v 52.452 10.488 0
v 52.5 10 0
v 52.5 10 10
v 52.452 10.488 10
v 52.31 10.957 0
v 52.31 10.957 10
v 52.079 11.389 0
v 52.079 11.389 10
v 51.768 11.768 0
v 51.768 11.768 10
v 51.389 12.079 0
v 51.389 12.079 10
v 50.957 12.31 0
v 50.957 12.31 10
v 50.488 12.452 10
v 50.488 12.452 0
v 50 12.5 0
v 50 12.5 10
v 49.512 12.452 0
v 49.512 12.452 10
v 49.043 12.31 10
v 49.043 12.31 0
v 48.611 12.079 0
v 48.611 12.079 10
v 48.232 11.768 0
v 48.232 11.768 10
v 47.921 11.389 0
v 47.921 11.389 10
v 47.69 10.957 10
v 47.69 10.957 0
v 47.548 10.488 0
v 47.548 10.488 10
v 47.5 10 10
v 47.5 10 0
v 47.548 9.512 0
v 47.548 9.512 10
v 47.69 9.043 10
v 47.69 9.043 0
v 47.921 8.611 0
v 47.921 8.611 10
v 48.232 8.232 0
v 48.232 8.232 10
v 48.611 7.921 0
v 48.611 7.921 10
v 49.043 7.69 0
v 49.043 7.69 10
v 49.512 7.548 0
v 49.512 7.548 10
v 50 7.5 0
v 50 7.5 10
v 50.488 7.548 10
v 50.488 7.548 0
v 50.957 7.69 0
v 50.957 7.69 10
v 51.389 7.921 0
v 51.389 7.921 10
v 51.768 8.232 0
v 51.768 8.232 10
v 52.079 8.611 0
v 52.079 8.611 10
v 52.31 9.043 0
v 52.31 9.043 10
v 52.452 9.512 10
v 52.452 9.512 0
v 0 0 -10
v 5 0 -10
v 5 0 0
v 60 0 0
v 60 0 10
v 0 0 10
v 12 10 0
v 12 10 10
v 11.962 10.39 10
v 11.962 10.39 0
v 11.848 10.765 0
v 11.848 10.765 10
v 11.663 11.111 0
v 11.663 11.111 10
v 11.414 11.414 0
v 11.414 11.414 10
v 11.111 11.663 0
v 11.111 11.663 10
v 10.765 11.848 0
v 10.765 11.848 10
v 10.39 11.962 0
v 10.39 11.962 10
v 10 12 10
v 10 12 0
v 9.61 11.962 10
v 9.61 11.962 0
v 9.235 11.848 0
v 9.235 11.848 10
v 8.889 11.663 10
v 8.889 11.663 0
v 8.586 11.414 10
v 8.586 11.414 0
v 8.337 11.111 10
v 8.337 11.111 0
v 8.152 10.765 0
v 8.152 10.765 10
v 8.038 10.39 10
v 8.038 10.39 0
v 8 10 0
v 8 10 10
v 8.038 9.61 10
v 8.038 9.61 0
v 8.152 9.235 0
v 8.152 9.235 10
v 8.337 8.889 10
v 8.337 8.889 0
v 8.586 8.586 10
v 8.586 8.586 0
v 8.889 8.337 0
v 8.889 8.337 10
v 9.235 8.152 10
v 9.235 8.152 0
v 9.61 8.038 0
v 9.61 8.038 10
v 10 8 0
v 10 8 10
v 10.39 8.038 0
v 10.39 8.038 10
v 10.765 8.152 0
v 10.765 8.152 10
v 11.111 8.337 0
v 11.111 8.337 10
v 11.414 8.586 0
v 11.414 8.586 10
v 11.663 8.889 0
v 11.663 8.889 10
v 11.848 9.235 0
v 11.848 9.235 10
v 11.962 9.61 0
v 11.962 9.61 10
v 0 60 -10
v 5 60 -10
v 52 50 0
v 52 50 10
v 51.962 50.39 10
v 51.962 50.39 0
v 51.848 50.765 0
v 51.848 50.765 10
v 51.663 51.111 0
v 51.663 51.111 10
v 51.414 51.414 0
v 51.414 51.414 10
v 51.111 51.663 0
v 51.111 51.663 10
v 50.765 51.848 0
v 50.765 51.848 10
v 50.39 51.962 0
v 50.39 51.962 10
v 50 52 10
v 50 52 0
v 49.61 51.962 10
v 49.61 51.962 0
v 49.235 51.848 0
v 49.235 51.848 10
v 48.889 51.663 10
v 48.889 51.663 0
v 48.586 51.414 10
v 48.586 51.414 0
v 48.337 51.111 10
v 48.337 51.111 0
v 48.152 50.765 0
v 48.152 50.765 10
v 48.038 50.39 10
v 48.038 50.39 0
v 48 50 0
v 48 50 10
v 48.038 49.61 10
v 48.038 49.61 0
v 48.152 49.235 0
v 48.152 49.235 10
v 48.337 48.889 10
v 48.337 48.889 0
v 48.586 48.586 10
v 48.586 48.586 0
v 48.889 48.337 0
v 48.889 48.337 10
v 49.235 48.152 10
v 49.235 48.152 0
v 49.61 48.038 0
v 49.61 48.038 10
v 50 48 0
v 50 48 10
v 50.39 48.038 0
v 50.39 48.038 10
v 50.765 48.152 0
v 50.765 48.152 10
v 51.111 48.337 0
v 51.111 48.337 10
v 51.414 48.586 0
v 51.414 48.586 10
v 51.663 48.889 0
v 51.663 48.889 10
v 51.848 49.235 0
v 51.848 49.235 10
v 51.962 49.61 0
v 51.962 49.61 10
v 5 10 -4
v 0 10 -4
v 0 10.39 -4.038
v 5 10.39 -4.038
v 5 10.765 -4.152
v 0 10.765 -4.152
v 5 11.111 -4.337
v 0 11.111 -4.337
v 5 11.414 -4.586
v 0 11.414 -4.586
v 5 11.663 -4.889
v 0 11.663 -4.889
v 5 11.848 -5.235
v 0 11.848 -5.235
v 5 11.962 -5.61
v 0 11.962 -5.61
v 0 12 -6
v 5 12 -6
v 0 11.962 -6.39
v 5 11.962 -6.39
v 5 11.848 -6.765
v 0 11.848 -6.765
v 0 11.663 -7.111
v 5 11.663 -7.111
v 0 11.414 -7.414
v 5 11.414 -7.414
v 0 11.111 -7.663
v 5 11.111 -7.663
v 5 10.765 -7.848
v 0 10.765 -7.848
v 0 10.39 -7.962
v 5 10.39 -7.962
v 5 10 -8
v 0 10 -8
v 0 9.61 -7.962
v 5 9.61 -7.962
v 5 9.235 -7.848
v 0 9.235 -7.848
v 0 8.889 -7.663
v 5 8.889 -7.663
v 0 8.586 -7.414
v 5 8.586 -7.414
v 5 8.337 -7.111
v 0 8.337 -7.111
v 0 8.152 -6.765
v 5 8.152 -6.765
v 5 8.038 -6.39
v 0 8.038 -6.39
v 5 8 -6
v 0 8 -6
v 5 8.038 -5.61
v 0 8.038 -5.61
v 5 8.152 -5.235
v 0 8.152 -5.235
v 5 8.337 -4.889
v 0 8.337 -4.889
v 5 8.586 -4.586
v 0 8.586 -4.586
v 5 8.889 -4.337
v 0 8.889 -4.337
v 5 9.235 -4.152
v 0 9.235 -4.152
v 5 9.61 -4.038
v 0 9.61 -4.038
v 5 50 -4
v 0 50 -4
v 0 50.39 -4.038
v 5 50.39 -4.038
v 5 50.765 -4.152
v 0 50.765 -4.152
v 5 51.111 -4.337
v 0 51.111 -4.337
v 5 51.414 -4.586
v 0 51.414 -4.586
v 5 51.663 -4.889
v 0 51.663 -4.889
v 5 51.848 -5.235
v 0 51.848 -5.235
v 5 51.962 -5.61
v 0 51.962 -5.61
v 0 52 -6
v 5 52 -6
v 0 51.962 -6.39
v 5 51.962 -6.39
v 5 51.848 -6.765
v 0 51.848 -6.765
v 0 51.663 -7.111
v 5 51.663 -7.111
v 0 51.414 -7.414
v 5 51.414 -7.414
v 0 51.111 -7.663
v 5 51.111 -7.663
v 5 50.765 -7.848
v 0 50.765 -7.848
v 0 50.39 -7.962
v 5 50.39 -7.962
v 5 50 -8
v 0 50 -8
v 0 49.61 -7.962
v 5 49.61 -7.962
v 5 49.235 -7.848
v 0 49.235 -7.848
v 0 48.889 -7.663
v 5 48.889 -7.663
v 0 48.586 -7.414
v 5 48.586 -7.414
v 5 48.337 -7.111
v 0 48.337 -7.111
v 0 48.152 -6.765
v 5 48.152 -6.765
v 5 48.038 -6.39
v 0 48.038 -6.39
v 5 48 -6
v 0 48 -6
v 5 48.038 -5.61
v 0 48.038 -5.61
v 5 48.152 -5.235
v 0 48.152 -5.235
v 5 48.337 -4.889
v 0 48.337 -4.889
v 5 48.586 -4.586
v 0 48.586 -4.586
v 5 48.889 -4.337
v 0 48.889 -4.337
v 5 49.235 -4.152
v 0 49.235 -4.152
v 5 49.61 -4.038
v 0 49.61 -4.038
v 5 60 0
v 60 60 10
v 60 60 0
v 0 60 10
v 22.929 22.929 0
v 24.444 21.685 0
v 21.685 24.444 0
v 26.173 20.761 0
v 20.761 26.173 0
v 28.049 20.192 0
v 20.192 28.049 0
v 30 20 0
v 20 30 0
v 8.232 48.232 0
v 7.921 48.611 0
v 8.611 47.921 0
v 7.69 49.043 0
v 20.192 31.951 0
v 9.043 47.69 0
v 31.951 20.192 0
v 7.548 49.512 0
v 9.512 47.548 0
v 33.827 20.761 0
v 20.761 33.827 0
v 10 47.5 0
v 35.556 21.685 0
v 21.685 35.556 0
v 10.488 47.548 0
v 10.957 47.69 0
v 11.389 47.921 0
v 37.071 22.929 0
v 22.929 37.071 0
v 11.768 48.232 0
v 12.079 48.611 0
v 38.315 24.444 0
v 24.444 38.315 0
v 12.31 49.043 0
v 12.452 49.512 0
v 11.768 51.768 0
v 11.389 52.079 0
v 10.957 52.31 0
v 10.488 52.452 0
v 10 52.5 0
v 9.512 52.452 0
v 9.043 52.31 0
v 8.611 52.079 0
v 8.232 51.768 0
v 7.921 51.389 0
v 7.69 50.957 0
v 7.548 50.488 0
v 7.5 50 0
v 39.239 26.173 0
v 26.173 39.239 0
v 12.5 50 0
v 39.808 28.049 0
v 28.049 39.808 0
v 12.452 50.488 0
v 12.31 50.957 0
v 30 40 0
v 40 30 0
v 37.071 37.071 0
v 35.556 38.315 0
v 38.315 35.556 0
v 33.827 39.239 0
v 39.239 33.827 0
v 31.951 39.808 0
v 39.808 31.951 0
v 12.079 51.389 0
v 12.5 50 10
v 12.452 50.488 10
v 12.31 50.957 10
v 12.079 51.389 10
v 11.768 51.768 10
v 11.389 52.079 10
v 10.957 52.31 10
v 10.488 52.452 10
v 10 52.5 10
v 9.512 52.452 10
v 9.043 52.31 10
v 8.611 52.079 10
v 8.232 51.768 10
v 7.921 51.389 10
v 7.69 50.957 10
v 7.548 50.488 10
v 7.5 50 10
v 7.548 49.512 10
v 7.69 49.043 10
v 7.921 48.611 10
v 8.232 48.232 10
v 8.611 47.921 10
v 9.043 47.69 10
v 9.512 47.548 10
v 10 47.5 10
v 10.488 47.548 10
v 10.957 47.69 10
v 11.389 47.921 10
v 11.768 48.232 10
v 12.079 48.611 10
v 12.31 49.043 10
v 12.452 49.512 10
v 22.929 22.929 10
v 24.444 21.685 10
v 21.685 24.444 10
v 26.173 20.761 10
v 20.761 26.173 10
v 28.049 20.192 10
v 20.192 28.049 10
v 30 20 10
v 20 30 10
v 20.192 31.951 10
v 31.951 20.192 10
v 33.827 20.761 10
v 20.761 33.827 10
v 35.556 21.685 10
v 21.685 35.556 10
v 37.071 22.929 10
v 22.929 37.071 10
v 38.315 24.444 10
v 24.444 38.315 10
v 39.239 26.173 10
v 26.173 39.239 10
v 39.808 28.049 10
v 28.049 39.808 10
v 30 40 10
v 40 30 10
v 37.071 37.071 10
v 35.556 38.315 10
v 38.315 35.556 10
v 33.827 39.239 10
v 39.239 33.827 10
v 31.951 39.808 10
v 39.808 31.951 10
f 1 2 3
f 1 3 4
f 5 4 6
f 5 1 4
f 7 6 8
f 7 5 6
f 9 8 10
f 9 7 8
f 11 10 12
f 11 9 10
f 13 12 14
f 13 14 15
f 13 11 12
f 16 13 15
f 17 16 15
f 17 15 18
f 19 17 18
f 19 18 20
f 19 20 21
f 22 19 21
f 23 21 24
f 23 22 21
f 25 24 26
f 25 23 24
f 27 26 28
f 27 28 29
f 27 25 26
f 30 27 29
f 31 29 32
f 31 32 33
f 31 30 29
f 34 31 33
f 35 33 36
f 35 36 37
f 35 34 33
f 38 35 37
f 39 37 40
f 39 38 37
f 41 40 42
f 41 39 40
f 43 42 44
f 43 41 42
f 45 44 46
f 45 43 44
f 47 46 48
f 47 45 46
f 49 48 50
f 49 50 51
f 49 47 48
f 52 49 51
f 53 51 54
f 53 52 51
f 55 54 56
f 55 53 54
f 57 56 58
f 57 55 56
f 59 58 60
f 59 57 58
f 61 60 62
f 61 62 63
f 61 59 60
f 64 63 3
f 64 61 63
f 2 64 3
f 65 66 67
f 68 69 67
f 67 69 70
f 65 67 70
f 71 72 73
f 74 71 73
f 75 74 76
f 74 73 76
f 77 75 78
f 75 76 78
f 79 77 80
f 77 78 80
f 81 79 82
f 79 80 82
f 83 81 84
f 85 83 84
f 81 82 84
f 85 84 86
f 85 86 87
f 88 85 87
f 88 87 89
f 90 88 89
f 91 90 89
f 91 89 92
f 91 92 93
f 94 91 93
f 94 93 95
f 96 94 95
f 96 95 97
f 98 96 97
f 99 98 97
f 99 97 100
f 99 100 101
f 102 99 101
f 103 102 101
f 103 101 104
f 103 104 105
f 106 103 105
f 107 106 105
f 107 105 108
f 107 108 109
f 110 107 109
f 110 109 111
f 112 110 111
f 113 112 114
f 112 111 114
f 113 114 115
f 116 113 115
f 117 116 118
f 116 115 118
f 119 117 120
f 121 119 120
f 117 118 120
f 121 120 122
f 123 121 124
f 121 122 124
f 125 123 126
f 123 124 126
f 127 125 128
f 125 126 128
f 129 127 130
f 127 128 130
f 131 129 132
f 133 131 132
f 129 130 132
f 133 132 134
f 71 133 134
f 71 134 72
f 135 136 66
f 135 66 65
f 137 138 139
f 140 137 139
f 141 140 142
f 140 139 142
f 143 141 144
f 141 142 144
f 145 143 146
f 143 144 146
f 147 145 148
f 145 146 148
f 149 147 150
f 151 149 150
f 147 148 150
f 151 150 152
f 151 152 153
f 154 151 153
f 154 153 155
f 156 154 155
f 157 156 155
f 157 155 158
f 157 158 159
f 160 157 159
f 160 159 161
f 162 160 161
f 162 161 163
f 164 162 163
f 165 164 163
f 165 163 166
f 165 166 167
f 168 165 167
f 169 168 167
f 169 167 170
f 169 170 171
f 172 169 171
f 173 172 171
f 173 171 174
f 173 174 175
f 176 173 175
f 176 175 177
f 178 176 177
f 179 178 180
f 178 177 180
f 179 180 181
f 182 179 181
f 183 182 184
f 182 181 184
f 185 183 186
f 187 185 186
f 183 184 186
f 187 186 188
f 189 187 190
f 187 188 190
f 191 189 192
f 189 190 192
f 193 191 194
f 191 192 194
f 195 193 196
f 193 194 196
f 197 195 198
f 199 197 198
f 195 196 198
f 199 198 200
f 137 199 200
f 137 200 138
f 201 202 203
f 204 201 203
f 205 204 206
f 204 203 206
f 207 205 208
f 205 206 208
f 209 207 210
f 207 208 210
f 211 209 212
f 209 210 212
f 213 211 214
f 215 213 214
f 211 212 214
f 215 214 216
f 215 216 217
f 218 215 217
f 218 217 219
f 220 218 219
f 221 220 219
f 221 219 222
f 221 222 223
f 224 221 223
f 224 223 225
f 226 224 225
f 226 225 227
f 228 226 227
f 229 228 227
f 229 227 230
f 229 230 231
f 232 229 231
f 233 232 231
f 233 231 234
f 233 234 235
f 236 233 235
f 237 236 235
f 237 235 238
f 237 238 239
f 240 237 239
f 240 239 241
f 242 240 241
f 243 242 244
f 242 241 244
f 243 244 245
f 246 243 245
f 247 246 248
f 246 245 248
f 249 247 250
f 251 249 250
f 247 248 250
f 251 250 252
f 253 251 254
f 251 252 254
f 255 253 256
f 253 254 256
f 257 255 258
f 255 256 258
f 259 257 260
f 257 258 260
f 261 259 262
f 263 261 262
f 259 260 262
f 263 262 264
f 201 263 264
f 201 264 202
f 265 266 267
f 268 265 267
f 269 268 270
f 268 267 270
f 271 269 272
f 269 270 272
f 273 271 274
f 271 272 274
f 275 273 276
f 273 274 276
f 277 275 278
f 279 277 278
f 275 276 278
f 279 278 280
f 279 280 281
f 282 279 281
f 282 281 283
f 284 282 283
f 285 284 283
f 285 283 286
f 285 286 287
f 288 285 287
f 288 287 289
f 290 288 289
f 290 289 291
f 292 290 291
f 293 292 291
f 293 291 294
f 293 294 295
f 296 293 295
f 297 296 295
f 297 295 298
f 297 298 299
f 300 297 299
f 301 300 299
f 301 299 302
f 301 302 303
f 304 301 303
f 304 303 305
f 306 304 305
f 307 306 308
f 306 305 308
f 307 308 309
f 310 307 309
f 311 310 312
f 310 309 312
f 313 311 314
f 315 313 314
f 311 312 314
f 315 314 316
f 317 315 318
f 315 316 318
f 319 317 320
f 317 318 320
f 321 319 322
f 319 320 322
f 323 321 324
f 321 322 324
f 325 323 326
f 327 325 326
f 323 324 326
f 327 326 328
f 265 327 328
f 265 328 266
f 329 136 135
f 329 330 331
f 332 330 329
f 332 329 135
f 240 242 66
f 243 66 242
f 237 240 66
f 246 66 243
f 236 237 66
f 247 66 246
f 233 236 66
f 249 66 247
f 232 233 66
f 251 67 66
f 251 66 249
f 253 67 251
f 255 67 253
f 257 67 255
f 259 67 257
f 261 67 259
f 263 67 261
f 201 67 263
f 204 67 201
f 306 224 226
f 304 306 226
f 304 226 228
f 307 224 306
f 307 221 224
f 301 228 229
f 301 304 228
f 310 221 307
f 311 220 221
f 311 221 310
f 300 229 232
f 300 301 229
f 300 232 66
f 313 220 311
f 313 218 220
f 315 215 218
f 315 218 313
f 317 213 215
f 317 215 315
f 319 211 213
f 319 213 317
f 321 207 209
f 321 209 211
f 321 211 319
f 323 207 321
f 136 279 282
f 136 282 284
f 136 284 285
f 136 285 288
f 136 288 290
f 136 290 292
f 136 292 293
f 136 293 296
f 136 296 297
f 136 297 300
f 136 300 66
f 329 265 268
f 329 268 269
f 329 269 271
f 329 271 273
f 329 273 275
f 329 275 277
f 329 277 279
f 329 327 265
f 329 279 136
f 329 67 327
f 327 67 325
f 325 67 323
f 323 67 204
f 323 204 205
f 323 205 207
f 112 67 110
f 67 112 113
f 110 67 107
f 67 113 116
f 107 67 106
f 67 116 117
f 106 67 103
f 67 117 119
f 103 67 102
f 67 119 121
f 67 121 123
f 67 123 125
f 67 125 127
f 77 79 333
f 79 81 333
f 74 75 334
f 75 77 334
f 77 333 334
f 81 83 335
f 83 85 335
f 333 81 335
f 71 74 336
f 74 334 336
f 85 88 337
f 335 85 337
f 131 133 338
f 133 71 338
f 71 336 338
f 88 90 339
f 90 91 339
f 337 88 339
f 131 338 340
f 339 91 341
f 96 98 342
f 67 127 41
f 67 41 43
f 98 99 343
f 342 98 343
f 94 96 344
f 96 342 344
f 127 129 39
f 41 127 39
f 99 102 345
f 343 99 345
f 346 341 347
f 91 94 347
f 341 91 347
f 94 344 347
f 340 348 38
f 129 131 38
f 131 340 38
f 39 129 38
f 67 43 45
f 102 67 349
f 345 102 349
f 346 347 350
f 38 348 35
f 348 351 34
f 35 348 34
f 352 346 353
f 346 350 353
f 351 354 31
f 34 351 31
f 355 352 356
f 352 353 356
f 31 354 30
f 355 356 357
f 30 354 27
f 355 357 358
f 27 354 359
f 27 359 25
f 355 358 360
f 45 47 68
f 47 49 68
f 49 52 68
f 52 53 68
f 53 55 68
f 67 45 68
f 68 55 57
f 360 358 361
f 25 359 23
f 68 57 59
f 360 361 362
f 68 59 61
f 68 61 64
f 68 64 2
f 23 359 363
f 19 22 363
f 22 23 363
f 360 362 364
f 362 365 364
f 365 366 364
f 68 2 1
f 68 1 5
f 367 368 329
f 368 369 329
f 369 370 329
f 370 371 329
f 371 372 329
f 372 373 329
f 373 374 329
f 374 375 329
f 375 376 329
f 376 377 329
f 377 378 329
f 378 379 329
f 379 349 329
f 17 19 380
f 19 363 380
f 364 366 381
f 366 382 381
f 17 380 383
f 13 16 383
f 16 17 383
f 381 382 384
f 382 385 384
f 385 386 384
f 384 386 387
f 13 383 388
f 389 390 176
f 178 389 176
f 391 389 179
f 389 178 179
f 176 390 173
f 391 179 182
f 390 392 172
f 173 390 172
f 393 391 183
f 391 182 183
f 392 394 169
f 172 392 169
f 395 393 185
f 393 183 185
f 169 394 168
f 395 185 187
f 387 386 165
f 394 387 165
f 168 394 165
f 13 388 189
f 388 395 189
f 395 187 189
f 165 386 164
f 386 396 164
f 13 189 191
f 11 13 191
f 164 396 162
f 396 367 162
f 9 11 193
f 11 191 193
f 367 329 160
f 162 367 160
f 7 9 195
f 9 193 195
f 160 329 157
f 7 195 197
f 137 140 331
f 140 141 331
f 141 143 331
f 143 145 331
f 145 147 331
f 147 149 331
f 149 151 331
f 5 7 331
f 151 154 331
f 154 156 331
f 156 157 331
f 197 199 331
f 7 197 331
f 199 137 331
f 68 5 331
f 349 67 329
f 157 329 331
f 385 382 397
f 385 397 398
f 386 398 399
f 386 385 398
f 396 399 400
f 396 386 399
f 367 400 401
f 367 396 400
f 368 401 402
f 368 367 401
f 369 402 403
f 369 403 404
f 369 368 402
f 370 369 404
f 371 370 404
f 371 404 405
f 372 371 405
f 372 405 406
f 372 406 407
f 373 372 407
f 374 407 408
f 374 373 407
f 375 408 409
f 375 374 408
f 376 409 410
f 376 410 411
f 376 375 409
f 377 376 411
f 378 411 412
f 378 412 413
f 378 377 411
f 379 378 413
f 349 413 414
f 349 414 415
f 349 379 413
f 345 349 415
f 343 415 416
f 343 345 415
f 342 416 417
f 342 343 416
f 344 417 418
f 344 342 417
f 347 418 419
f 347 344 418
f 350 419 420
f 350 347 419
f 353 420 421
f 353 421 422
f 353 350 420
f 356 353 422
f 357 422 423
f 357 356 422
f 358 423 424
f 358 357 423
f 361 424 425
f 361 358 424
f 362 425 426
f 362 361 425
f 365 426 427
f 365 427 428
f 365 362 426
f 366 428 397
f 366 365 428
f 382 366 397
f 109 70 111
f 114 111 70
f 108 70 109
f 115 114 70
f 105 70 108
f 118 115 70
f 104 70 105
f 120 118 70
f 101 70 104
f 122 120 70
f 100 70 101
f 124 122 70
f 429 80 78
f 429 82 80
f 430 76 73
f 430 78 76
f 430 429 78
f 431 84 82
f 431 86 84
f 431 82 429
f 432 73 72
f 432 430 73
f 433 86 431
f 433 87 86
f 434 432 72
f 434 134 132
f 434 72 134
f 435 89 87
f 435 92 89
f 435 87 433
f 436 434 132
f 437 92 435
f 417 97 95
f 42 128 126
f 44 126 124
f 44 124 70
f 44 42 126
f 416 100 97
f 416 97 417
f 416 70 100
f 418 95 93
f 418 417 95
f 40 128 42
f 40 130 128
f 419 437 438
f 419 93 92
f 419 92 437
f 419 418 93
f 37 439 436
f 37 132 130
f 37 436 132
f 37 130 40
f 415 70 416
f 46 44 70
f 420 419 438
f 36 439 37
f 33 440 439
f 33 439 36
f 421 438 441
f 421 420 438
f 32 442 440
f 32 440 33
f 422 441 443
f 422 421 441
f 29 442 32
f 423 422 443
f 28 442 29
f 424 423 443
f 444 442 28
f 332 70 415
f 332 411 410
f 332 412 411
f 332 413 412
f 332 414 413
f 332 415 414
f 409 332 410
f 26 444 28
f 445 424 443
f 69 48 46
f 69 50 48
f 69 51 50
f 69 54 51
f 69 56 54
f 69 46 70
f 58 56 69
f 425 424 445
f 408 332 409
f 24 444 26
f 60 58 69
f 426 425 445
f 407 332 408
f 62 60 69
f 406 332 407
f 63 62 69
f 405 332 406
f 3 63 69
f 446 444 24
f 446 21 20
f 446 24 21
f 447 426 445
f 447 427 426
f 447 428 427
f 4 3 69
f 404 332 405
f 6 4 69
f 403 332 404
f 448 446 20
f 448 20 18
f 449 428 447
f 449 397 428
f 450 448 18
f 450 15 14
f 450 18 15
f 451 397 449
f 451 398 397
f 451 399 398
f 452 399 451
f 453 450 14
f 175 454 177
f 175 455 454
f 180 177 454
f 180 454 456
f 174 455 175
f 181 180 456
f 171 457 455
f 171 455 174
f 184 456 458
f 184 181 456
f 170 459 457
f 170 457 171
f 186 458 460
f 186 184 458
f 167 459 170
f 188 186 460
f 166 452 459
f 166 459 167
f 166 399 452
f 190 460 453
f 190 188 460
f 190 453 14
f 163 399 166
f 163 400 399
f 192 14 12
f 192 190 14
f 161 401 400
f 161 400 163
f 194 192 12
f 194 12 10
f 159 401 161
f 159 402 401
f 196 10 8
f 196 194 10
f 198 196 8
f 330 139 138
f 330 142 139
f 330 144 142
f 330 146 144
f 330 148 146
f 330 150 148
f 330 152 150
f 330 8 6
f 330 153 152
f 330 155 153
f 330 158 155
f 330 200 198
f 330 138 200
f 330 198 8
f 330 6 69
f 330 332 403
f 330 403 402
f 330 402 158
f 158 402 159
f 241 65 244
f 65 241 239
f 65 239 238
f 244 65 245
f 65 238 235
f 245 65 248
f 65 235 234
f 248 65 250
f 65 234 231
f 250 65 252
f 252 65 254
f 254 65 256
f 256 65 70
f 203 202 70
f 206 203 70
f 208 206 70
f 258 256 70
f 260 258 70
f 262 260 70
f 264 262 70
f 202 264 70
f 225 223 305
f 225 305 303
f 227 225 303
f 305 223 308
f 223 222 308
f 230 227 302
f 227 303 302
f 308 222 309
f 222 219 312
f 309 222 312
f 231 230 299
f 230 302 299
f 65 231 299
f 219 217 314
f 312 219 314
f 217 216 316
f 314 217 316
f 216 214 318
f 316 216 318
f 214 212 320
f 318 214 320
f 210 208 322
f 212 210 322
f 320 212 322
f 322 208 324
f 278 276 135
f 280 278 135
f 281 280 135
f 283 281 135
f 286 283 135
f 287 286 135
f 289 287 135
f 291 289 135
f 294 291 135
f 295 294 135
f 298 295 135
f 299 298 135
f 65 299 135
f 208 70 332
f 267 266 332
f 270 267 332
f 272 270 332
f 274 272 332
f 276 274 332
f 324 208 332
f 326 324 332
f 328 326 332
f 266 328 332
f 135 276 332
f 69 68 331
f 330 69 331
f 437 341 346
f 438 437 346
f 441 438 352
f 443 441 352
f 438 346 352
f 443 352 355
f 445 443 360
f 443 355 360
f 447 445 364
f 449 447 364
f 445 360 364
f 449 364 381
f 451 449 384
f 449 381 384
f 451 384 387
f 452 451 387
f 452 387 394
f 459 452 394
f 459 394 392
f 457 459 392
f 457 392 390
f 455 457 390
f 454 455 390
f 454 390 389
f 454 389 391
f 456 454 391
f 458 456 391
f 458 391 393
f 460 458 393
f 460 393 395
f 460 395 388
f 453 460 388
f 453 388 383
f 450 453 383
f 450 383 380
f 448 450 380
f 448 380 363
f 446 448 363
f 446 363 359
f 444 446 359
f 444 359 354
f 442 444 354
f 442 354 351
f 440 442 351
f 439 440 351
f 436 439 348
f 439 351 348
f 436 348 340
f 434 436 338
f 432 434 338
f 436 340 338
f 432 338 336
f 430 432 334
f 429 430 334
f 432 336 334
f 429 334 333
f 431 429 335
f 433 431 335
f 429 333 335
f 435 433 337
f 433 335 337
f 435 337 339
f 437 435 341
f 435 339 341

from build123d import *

# Parameters (mm, degrees)
SKETCH1_W           = 60
SKETCH1_H           = 60
BOSS_EXTRUDE1_DEPTH = 10
SKETCH4_W           = 5
SKETCH4_H           = 60
BOSS_EXTRUDE2_DEPTH = 10
SKETCH5_R           = 2
CUT_EXTRUDE3_DEPTH  = 86.440037453
SKETCH2_R           = 10
CUT_EXTRUDE5_DEPTH  = 86.440037453
CAVITY1_OUTLINE_R   = 2.5
CAVITY1_DEPTH       = 10
SKETCH7_R           = 2
CUT_EXTRUDE6_DEPTH  = 88.177978871


# Read off the part's stored shape, not the designer's step: Cavity1
with BuildPart() as part:
    # Sketch1 → Boss-Extrude1 (new body)
    with BuildSketch(Plane.XY):
        with Locations((30, 30)):
            Rectangle(SKETCH1_W, SKETCH1_H)
    extrude(amount=BOSS_EXTRUDE1_DEPTH)

    # Sketch4 → Boss-Extrude2 (add)
    with BuildSketch(Plane(origin=(0, 0, 0), x_dir=(-1, 0, 0), z_dir=(0, 0, -1))):
        with Locations((-2.5, 30)):
            Rectangle(SKETCH4_W, SKETCH4_H)
    extrude(amount=BOSS_EXTRUDE2_DEPTH)

    # Sketch5 → Cut-Extrude3 (cut, through all)
    with BuildSketch(Plane.ZY):
        with Locations((-6, 50)):
            Circle(SKETCH5_R)
        with Locations((-6, 10)):
            Circle(SKETCH5_R)
    extrude(amount=-CUT_EXTRUDE3_DEPTH, mode=Mode.SUBTRACT)

    # Sketch2 → Cut-Extrude5 (cut, through all)
    with BuildSketch(Plane(origin=(0, 0, 0), x_dir=(-1, 0, 0), z_dir=(0, 0, -1))):
        with Locations((-30, 30)):
            Circle(SKETCH2_R)
    extrude(amount=-CUT_EXTRUDE5_DEPTH, mode=Mode.SUBTRACT)

    # Cavity1 outline → Cavity1 (cut)
    with BuildSketch(Plane.XY):
        with Locations((10, 50)):
            Circle(CAVITY1_OUTLINE_R)
        with Locations((50, 10)):
            Circle(CAVITY1_OUTLINE_R)
    extrude(amount=CAVITY1_DEPTH, mode=Mode.SUBTRACT)

    # Sketch7 → Cut-Extrude6 (cut, through all)
    with BuildSketch(Plane.XY.offset(10)):
        with Locations((50, 50)):
            Circle(SKETCH7_R)
        with Locations((10, 10)):
            Circle(SKETCH7_R)
    extrude(amount=-CUT_EXTRUDE6_DEPTH, mode=Mode.SUBTRACT)


solid = part.part
